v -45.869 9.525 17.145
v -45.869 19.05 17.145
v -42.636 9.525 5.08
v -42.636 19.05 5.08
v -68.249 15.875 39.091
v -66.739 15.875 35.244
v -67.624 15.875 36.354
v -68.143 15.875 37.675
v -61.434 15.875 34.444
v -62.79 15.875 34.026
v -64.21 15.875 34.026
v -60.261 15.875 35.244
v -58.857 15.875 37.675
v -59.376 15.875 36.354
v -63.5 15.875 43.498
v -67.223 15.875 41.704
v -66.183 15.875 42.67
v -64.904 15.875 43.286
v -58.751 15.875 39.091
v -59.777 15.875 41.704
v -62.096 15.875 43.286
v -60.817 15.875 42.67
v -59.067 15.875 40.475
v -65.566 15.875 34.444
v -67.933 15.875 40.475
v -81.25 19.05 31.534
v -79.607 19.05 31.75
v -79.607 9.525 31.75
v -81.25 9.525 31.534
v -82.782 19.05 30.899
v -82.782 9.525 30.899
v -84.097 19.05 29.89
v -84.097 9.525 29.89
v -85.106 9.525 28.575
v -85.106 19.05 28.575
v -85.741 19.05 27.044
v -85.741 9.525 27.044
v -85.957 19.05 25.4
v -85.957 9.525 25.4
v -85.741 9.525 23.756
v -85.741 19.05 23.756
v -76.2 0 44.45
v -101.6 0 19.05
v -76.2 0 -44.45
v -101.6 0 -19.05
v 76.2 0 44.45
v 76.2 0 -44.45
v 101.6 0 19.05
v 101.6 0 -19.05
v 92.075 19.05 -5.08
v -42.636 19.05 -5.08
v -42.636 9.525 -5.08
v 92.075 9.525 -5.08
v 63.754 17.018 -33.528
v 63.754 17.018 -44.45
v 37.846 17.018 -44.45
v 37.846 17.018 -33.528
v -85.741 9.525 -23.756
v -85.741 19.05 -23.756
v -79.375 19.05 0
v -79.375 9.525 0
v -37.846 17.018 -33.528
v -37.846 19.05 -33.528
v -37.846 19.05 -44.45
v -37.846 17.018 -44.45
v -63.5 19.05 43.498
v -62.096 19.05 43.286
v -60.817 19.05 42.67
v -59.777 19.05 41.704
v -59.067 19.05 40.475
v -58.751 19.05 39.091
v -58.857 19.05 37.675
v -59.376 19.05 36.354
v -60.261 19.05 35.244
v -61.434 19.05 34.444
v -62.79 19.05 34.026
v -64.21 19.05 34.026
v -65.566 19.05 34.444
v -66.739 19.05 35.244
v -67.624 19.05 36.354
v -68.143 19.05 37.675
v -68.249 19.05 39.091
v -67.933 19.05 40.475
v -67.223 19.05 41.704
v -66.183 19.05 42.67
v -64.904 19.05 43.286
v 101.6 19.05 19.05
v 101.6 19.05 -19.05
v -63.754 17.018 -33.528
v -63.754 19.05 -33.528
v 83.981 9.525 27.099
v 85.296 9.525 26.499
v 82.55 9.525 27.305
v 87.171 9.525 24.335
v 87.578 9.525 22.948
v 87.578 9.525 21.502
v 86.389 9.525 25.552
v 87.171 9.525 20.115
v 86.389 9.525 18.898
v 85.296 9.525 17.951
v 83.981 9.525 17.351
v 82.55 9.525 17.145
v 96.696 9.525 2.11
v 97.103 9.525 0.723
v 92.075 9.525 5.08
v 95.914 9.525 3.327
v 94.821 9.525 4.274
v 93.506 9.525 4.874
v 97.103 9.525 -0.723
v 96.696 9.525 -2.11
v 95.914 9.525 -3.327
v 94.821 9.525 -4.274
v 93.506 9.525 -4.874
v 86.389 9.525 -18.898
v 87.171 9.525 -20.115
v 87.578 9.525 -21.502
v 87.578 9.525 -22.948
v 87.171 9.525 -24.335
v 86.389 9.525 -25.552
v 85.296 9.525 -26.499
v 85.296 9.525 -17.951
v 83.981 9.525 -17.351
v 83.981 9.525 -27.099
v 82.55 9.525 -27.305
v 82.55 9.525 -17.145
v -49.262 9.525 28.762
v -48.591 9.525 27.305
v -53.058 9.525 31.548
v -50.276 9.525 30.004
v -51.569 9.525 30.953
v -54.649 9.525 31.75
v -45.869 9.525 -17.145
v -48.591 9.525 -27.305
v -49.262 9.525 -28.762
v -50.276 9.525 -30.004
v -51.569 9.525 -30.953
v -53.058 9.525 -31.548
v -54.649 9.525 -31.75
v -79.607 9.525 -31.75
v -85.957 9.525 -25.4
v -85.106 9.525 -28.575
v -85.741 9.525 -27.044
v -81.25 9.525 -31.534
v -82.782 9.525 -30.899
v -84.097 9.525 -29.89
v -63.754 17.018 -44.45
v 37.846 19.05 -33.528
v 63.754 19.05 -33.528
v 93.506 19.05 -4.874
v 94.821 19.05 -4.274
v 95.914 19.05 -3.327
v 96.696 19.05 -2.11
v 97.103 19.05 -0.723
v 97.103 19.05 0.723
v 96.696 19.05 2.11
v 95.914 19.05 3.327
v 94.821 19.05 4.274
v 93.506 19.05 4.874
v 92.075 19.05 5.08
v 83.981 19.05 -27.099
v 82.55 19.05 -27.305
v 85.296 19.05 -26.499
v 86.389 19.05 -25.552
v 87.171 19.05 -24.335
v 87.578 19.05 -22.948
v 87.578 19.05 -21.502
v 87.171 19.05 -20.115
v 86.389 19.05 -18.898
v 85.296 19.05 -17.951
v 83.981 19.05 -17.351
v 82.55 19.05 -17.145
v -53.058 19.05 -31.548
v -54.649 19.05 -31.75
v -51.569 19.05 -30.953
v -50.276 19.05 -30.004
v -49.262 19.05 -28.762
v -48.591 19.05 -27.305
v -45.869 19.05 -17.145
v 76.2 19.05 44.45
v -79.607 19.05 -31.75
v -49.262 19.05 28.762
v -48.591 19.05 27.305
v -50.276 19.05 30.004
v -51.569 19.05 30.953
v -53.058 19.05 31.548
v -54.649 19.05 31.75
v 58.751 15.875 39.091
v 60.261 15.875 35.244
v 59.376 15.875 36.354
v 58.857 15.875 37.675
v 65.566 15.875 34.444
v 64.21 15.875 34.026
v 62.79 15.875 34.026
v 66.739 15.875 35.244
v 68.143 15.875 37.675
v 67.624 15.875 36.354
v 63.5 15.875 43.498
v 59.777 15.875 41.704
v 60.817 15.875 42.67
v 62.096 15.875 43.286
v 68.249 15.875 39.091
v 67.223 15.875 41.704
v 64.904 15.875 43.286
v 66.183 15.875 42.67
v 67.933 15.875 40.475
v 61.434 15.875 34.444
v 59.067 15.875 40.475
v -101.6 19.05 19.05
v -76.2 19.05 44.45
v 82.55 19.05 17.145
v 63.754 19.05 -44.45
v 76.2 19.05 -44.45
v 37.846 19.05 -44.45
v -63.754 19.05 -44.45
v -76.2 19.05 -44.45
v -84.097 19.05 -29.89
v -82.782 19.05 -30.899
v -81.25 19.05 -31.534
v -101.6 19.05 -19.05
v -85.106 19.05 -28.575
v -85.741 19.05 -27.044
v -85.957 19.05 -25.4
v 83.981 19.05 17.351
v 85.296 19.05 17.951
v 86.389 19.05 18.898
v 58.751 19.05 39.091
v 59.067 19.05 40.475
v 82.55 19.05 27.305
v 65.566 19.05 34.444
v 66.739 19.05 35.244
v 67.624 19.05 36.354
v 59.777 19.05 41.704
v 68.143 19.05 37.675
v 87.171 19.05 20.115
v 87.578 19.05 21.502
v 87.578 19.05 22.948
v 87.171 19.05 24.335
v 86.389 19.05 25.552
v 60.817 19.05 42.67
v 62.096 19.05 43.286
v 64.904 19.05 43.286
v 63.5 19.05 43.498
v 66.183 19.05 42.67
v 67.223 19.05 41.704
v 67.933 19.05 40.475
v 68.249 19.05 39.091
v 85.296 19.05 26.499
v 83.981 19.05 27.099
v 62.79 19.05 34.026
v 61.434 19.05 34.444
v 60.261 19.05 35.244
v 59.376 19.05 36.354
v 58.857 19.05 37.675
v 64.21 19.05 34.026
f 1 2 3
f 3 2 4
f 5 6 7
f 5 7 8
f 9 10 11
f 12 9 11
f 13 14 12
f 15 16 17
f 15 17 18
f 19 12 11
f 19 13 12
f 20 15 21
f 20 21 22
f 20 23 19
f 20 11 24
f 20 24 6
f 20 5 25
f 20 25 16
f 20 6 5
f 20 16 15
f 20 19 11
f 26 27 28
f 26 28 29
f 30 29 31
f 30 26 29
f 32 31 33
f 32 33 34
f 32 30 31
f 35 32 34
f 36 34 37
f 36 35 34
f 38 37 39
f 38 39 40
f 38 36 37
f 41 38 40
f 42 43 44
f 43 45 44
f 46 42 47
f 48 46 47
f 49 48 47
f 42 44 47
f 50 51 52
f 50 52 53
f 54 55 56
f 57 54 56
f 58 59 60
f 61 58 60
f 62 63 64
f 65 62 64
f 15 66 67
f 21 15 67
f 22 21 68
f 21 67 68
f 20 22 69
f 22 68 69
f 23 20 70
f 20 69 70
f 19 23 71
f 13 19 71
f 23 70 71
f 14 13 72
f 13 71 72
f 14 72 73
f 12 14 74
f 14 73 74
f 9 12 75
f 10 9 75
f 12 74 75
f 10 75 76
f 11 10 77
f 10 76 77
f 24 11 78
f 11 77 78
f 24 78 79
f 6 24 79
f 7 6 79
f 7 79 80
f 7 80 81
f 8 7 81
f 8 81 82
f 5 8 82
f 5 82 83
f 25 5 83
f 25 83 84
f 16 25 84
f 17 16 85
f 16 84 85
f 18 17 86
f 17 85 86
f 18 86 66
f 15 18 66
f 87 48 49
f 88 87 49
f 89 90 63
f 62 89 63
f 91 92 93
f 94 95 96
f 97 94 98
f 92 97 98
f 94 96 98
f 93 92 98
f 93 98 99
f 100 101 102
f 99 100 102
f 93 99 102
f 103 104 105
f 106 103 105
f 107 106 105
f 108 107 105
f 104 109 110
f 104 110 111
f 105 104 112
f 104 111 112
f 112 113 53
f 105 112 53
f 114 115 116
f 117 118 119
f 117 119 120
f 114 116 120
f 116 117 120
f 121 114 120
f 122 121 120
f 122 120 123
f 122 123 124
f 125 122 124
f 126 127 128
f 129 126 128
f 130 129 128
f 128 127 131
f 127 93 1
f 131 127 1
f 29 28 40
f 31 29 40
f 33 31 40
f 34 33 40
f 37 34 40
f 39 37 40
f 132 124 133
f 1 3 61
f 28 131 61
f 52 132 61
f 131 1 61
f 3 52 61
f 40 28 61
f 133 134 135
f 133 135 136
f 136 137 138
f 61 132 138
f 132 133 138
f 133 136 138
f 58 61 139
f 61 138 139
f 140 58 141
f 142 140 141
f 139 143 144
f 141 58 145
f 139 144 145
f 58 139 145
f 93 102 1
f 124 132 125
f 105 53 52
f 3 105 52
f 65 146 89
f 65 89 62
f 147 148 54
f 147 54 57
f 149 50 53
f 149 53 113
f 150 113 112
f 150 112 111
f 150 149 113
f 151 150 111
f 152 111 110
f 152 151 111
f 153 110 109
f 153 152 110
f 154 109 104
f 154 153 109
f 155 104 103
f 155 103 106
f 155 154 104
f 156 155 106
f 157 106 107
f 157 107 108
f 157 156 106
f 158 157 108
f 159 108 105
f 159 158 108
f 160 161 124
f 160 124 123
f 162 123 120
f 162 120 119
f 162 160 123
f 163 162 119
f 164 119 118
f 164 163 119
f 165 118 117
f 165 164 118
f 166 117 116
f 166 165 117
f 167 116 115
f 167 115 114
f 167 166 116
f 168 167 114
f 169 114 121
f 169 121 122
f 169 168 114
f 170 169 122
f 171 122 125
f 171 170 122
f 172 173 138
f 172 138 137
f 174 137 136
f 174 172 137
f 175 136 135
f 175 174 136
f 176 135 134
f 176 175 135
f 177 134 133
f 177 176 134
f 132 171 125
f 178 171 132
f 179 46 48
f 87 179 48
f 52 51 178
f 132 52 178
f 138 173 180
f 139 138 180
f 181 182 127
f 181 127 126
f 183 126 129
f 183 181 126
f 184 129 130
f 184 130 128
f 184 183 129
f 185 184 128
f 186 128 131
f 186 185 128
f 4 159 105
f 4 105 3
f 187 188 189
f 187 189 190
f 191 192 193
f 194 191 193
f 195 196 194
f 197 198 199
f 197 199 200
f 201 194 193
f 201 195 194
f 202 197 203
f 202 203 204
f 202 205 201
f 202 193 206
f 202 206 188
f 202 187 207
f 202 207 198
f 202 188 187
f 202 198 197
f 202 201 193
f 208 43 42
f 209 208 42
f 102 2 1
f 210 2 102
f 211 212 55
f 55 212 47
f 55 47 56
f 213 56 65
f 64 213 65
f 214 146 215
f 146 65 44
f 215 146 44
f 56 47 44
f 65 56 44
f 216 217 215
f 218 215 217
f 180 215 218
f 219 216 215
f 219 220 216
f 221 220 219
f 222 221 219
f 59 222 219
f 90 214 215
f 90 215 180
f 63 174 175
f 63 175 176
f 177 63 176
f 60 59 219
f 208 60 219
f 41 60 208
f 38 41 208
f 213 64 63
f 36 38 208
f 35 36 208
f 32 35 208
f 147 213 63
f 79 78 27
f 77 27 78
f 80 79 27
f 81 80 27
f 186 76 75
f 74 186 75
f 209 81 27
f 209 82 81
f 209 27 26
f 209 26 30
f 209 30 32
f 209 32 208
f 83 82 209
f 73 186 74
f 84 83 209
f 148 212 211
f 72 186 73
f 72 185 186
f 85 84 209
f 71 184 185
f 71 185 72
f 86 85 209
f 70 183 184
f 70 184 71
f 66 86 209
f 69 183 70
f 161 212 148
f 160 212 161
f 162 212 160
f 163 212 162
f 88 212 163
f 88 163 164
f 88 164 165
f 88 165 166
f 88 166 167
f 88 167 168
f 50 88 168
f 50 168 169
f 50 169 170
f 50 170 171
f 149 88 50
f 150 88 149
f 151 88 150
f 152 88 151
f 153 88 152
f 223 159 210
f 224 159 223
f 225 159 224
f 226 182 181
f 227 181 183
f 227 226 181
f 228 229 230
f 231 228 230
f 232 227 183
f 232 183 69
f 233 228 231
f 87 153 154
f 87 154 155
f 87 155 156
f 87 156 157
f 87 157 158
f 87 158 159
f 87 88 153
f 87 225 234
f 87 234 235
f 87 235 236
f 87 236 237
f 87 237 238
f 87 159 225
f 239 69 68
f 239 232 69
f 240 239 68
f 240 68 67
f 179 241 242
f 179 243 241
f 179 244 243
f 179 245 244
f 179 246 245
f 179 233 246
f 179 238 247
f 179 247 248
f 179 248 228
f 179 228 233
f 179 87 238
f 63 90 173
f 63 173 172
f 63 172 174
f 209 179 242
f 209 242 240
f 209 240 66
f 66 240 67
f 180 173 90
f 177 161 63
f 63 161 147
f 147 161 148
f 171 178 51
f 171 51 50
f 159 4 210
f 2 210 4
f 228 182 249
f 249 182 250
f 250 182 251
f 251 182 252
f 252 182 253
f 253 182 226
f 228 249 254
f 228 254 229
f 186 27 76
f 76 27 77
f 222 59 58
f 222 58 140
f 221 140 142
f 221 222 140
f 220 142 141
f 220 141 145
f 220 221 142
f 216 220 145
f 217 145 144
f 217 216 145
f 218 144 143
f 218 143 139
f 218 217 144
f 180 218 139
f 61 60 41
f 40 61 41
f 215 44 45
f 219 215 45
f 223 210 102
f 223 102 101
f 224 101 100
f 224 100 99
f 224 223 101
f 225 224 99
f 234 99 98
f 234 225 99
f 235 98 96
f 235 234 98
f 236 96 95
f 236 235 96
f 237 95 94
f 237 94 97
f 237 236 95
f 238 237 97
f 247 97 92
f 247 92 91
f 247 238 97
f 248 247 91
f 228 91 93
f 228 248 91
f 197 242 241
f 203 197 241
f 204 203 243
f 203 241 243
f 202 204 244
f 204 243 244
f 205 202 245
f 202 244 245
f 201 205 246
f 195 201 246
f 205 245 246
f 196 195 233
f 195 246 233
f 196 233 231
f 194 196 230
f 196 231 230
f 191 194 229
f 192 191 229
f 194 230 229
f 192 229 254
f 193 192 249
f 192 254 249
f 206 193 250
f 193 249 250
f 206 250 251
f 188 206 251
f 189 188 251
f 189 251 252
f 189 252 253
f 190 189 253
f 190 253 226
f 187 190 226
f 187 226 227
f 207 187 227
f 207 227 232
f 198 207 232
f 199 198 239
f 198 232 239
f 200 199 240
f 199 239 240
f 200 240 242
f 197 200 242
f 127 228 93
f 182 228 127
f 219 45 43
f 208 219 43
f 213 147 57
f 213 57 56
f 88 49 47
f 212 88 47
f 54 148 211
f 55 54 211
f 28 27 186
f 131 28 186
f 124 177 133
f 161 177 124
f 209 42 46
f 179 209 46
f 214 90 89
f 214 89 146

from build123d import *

# Parameters (mm, degrees)
BOSS_EXTRUDE1_DEPTH = 19.05
CUT_EXTRUDE1_DEPTH  = 9.525
CUT_EXTRUDE2_DEPTH  = 9.525
FILLET2_R           = 6.35
SKETCH5_R           = 4.7625
CUT_EXTRUDE3_DEPTH  = 3.175
SKETCH6_W           = 25.908
SKETCH6_H           = 10.922
CUT_EXTRUDE4_DEPTH  = 2.032


with BuildPart() as part:
    # Sketch1 → Boss-Extrude1 (new body)
    with BuildSketch(Plane(origin=(0, 0, 0), x_dir=(1, 0, 0), z_dir=(0, 1, 0))):
        Polygon((-101.6, -19.05), (-76.2, -44.45), (76.2, -44.45), (101.6, -19.05), (101.6, 19.05), (76.2, 44.45), (-76.2, 44.45), (-101.6, 19.05), align=None)
    extrude(amount=BOSS_EXTRUDE1_DEPTH)

    # Sketch2 → Cut-Extrude1 (cut)
    with BuildSketch(Plane(origin=(0, 19.05, 0), x_dir=(1, 0, 0), z_dir=(0, 1, 0))):
        with BuildLine():
            Line((-76.2, 27.305), (82.55, 27.305))
            ThreePointArc((82.55, 27.305), (87.63, 22.225), (82.55, 17.145))
            Line((82.55, 17.145), (-76.2, 17.145))
            ThreePointArc((-76.2, 17.145), (-81.28, 22.225), (-76.2, 27.305))
        make_face()
        with BuildLine():
            Line((92.075, -5.08), (-66.675, -5.08))
            ThreePointArc((-66.675, -5.08), (-71.755, 0), (-66.675, 5.08))
            Line((-66.675, 5.08), (92.075, 5.08))
            ThreePointArc((92.075, 5.08), (97.155, 0), (92.075, -5.08))
        make_face()
        with BuildLine():
            Line((-76.2, -17.145), (82.55, -17.145))
            ThreePointArc((82.55, -17.145), (87.63, -22.225), (82.55, -27.305))
            Line((82.55, -27.305), (-76.2, -27.305))
            ThreePointArc((-76.2, -27.305), (-81.28, -22.225), (-76.2, -17.145))
        make_face()
    extrude(amount=-CUT_EXTRUDE1_DEPTH, mode=Mode.SUBTRACT)

    # Sketch3 → Cut-Extrude2 (cut)
    with BuildSketch(Plane(origin=(0, 19.05, 0), x_dir=(1, 0, 0), z_dir=(0, 1, 0))):
        Polygon((-87.88238686, 31.75), (-79.375, 0), (-87.88238686, -31.75), (-49.78238686, -31.75), (-41.275, 0), (-49.78238686, 31.75), align=None)
    extrude(amount=-CUT_EXTRUDE2_DEPTH, mode=Mode.SUBTRACT)

    # Fillet2
    # the kernel refuses this fillet: 6.35 mm, written as the material it adds along each edge
    with BuildSketch(Plane(origin=(-49.78238686, 19.05, 31.75), x_dir=(-1, 0, 0), z_dir=(0, -1, 0))) as fillet2_piece_1:
        with BuildLine():
            CenterArc((4.866479769, 6.35), FILLET2_R, 197.457603124, 72.542396876)
            Line((-1.19103416, 4.445), (0, 0))
            Line((0, 0), (4.866479769, 0))
        make_face()
    extrude(amount=9.525)
    with BuildSketch(Plane(origin=(-49.78238686, 19.05, -31.75), x_dir=(0.2588190451025257, 0, 0.9659258262890671), z_dir=(0, -1, 0))) as fillet2_piece_2:
        with BuildLine():
            CenterArc((4.87409135, 6.344159428), FILLET2_R, 195, 72.542396876)
            Line((-1.259537647, 4.700658492), (0, 0))
            Line((0, 0), (4.601802622, 0))
        make_face()
    extrude(amount=9.525)
    with BuildSketch(Plane(origin=(-87.88238686, 19.05, 31.75), x_dir=(0.2588190451025169, 0, -0.9659258262890692), z_dir=(0, -1, 0)), Plane(origin=(-87.88238686, 19.05, -31.75), x_dir=(1, 0, 0), z_dir=(0, -1, 0))) as fillet2_piece_3:
        with BuildLine():
            CenterArc((FILLET2_R * 1.30322537284, FILLET2_R), FILLET2_R, 165, 105)
            Line((FILLET2_R * 0.337299546552, FILLET2_R * 1.2588190451), (0, 0))
            Line((0, 0), (FILLET2_R * 1.30322537284, 0))
        make_face()
    extrude(amount=9.525)

    # Sketch5 → Cut-Extrude3 (cut)
    with BuildSketch(Plane(origin=(0, 19.05, 0), x_dir=(1, 0, 0), z_dir=(0, 1, 0))):
        with Locations(Location((-63.5, -38.735, 0), (0, 0, 270))):
            Circle(SKETCH5_R)
        with Locations(Location((63.5, -38.735, 0), (0, 0, 270))):
            Circle(SKETCH5_R)
    extrude(amount=-CUT_EXTRUDE3_DEPTH, mode=Mode.SUBTRACT)

    # Sketch6 → Cut-Extrude4 (cut)
    with BuildSketch(Plane(origin=(0, 19.05, 0), x_dir=(1, 0, 0), z_dir=(0, 1, 0))):
        with Locations((-50.8, 38.989)):
            Rectangle(SKETCH6_W, SKETCH6_H)
    cut_extrude4 = extrude(amount=-CUT_EXTRUDE4_DEPTH, mode=Mode.SUBTRACT)

    # Mirror1: Cut-Extrude4 across plane
    add(cut_extrude4.mirror(Plane(origin=(0, 0, 0), x_dir=(0, 0, 1), z_dir=(1, 0, 0))), mode=Mode.SUBTRACT)


solid = part.part
